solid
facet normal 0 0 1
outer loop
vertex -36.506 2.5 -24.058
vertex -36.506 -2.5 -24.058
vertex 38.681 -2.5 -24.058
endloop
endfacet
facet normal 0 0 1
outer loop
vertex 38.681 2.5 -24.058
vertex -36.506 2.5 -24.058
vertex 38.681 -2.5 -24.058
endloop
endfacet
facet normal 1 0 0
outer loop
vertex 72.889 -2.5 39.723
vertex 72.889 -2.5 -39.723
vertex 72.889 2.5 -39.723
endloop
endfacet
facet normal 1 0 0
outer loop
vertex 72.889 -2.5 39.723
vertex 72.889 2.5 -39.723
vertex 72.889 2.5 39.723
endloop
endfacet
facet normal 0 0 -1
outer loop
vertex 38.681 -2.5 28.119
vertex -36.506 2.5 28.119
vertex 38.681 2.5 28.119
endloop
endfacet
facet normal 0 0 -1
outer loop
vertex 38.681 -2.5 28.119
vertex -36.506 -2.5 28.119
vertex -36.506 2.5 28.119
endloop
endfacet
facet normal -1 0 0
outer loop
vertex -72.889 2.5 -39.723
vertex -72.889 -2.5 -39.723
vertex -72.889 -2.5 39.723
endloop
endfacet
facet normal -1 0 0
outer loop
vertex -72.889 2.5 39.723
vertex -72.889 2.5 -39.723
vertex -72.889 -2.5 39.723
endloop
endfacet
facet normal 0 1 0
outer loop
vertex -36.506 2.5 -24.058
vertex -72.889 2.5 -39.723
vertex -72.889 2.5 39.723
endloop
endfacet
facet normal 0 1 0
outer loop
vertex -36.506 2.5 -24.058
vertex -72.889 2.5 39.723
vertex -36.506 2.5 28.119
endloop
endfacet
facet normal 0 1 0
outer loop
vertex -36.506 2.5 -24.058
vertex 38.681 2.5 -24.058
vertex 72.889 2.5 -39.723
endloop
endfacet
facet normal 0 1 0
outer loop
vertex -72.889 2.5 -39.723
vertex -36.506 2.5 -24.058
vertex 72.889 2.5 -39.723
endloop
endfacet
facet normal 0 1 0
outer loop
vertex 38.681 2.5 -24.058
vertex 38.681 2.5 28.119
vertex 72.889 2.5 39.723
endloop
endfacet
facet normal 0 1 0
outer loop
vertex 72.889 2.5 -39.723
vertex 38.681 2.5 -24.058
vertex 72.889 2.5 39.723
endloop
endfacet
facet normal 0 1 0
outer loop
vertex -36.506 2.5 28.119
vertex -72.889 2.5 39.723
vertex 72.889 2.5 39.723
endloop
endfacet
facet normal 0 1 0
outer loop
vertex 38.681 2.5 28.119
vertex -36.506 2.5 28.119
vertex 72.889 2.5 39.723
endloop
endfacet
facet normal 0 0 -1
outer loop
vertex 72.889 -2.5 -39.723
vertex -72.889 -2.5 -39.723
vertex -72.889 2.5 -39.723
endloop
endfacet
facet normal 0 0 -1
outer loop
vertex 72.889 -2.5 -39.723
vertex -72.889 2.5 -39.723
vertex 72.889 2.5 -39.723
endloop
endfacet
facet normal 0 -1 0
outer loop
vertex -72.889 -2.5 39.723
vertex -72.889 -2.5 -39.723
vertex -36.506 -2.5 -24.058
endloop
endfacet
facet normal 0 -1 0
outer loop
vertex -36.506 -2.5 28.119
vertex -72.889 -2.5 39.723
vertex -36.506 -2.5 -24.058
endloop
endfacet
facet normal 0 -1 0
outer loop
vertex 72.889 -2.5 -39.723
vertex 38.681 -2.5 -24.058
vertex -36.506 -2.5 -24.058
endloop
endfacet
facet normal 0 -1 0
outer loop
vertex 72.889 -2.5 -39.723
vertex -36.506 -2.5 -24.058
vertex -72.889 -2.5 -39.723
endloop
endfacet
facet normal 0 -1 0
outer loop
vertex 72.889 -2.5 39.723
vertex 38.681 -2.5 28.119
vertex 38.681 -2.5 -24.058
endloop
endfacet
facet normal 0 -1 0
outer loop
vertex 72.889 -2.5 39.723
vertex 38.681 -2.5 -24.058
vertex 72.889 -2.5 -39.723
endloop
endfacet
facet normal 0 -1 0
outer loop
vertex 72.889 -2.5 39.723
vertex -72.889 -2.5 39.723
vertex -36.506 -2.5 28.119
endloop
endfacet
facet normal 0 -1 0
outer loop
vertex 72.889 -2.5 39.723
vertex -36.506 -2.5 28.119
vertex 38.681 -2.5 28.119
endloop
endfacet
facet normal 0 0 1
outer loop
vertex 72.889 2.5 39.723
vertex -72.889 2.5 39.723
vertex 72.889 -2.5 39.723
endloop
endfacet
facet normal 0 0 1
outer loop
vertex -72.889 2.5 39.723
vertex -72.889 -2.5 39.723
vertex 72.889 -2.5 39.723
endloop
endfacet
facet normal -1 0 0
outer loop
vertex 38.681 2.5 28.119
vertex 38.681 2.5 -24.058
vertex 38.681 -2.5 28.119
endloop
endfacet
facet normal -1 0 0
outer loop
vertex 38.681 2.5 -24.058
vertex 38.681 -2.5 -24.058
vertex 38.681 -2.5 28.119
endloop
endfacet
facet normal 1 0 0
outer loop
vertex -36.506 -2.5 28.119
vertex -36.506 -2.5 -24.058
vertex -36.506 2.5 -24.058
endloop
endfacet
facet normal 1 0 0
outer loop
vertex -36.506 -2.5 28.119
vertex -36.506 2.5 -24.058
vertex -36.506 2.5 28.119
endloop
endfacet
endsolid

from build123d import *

# Parameters (mm, degrees)
F0_W     = 145.778776
F0_H     = 79.445884
F0_W_2   = 75.186506
F0_H_2   = 52.17734
F1_DEPTH = 2.5


with BuildPart() as f1:
    # F0 (on Front) → F1 (new body, symmetric)
    with BuildSketch(Plane.XZ):
        Rectangle(F0_W, F0_H)
        with Locations((1.087524, 2.030745)):
            Rectangle(F0_W_2, F0_H_2, mode=Mode.SUBTRACT)
    extrude(amount=F1_DEPTH, both=True)


solid = f1.part
